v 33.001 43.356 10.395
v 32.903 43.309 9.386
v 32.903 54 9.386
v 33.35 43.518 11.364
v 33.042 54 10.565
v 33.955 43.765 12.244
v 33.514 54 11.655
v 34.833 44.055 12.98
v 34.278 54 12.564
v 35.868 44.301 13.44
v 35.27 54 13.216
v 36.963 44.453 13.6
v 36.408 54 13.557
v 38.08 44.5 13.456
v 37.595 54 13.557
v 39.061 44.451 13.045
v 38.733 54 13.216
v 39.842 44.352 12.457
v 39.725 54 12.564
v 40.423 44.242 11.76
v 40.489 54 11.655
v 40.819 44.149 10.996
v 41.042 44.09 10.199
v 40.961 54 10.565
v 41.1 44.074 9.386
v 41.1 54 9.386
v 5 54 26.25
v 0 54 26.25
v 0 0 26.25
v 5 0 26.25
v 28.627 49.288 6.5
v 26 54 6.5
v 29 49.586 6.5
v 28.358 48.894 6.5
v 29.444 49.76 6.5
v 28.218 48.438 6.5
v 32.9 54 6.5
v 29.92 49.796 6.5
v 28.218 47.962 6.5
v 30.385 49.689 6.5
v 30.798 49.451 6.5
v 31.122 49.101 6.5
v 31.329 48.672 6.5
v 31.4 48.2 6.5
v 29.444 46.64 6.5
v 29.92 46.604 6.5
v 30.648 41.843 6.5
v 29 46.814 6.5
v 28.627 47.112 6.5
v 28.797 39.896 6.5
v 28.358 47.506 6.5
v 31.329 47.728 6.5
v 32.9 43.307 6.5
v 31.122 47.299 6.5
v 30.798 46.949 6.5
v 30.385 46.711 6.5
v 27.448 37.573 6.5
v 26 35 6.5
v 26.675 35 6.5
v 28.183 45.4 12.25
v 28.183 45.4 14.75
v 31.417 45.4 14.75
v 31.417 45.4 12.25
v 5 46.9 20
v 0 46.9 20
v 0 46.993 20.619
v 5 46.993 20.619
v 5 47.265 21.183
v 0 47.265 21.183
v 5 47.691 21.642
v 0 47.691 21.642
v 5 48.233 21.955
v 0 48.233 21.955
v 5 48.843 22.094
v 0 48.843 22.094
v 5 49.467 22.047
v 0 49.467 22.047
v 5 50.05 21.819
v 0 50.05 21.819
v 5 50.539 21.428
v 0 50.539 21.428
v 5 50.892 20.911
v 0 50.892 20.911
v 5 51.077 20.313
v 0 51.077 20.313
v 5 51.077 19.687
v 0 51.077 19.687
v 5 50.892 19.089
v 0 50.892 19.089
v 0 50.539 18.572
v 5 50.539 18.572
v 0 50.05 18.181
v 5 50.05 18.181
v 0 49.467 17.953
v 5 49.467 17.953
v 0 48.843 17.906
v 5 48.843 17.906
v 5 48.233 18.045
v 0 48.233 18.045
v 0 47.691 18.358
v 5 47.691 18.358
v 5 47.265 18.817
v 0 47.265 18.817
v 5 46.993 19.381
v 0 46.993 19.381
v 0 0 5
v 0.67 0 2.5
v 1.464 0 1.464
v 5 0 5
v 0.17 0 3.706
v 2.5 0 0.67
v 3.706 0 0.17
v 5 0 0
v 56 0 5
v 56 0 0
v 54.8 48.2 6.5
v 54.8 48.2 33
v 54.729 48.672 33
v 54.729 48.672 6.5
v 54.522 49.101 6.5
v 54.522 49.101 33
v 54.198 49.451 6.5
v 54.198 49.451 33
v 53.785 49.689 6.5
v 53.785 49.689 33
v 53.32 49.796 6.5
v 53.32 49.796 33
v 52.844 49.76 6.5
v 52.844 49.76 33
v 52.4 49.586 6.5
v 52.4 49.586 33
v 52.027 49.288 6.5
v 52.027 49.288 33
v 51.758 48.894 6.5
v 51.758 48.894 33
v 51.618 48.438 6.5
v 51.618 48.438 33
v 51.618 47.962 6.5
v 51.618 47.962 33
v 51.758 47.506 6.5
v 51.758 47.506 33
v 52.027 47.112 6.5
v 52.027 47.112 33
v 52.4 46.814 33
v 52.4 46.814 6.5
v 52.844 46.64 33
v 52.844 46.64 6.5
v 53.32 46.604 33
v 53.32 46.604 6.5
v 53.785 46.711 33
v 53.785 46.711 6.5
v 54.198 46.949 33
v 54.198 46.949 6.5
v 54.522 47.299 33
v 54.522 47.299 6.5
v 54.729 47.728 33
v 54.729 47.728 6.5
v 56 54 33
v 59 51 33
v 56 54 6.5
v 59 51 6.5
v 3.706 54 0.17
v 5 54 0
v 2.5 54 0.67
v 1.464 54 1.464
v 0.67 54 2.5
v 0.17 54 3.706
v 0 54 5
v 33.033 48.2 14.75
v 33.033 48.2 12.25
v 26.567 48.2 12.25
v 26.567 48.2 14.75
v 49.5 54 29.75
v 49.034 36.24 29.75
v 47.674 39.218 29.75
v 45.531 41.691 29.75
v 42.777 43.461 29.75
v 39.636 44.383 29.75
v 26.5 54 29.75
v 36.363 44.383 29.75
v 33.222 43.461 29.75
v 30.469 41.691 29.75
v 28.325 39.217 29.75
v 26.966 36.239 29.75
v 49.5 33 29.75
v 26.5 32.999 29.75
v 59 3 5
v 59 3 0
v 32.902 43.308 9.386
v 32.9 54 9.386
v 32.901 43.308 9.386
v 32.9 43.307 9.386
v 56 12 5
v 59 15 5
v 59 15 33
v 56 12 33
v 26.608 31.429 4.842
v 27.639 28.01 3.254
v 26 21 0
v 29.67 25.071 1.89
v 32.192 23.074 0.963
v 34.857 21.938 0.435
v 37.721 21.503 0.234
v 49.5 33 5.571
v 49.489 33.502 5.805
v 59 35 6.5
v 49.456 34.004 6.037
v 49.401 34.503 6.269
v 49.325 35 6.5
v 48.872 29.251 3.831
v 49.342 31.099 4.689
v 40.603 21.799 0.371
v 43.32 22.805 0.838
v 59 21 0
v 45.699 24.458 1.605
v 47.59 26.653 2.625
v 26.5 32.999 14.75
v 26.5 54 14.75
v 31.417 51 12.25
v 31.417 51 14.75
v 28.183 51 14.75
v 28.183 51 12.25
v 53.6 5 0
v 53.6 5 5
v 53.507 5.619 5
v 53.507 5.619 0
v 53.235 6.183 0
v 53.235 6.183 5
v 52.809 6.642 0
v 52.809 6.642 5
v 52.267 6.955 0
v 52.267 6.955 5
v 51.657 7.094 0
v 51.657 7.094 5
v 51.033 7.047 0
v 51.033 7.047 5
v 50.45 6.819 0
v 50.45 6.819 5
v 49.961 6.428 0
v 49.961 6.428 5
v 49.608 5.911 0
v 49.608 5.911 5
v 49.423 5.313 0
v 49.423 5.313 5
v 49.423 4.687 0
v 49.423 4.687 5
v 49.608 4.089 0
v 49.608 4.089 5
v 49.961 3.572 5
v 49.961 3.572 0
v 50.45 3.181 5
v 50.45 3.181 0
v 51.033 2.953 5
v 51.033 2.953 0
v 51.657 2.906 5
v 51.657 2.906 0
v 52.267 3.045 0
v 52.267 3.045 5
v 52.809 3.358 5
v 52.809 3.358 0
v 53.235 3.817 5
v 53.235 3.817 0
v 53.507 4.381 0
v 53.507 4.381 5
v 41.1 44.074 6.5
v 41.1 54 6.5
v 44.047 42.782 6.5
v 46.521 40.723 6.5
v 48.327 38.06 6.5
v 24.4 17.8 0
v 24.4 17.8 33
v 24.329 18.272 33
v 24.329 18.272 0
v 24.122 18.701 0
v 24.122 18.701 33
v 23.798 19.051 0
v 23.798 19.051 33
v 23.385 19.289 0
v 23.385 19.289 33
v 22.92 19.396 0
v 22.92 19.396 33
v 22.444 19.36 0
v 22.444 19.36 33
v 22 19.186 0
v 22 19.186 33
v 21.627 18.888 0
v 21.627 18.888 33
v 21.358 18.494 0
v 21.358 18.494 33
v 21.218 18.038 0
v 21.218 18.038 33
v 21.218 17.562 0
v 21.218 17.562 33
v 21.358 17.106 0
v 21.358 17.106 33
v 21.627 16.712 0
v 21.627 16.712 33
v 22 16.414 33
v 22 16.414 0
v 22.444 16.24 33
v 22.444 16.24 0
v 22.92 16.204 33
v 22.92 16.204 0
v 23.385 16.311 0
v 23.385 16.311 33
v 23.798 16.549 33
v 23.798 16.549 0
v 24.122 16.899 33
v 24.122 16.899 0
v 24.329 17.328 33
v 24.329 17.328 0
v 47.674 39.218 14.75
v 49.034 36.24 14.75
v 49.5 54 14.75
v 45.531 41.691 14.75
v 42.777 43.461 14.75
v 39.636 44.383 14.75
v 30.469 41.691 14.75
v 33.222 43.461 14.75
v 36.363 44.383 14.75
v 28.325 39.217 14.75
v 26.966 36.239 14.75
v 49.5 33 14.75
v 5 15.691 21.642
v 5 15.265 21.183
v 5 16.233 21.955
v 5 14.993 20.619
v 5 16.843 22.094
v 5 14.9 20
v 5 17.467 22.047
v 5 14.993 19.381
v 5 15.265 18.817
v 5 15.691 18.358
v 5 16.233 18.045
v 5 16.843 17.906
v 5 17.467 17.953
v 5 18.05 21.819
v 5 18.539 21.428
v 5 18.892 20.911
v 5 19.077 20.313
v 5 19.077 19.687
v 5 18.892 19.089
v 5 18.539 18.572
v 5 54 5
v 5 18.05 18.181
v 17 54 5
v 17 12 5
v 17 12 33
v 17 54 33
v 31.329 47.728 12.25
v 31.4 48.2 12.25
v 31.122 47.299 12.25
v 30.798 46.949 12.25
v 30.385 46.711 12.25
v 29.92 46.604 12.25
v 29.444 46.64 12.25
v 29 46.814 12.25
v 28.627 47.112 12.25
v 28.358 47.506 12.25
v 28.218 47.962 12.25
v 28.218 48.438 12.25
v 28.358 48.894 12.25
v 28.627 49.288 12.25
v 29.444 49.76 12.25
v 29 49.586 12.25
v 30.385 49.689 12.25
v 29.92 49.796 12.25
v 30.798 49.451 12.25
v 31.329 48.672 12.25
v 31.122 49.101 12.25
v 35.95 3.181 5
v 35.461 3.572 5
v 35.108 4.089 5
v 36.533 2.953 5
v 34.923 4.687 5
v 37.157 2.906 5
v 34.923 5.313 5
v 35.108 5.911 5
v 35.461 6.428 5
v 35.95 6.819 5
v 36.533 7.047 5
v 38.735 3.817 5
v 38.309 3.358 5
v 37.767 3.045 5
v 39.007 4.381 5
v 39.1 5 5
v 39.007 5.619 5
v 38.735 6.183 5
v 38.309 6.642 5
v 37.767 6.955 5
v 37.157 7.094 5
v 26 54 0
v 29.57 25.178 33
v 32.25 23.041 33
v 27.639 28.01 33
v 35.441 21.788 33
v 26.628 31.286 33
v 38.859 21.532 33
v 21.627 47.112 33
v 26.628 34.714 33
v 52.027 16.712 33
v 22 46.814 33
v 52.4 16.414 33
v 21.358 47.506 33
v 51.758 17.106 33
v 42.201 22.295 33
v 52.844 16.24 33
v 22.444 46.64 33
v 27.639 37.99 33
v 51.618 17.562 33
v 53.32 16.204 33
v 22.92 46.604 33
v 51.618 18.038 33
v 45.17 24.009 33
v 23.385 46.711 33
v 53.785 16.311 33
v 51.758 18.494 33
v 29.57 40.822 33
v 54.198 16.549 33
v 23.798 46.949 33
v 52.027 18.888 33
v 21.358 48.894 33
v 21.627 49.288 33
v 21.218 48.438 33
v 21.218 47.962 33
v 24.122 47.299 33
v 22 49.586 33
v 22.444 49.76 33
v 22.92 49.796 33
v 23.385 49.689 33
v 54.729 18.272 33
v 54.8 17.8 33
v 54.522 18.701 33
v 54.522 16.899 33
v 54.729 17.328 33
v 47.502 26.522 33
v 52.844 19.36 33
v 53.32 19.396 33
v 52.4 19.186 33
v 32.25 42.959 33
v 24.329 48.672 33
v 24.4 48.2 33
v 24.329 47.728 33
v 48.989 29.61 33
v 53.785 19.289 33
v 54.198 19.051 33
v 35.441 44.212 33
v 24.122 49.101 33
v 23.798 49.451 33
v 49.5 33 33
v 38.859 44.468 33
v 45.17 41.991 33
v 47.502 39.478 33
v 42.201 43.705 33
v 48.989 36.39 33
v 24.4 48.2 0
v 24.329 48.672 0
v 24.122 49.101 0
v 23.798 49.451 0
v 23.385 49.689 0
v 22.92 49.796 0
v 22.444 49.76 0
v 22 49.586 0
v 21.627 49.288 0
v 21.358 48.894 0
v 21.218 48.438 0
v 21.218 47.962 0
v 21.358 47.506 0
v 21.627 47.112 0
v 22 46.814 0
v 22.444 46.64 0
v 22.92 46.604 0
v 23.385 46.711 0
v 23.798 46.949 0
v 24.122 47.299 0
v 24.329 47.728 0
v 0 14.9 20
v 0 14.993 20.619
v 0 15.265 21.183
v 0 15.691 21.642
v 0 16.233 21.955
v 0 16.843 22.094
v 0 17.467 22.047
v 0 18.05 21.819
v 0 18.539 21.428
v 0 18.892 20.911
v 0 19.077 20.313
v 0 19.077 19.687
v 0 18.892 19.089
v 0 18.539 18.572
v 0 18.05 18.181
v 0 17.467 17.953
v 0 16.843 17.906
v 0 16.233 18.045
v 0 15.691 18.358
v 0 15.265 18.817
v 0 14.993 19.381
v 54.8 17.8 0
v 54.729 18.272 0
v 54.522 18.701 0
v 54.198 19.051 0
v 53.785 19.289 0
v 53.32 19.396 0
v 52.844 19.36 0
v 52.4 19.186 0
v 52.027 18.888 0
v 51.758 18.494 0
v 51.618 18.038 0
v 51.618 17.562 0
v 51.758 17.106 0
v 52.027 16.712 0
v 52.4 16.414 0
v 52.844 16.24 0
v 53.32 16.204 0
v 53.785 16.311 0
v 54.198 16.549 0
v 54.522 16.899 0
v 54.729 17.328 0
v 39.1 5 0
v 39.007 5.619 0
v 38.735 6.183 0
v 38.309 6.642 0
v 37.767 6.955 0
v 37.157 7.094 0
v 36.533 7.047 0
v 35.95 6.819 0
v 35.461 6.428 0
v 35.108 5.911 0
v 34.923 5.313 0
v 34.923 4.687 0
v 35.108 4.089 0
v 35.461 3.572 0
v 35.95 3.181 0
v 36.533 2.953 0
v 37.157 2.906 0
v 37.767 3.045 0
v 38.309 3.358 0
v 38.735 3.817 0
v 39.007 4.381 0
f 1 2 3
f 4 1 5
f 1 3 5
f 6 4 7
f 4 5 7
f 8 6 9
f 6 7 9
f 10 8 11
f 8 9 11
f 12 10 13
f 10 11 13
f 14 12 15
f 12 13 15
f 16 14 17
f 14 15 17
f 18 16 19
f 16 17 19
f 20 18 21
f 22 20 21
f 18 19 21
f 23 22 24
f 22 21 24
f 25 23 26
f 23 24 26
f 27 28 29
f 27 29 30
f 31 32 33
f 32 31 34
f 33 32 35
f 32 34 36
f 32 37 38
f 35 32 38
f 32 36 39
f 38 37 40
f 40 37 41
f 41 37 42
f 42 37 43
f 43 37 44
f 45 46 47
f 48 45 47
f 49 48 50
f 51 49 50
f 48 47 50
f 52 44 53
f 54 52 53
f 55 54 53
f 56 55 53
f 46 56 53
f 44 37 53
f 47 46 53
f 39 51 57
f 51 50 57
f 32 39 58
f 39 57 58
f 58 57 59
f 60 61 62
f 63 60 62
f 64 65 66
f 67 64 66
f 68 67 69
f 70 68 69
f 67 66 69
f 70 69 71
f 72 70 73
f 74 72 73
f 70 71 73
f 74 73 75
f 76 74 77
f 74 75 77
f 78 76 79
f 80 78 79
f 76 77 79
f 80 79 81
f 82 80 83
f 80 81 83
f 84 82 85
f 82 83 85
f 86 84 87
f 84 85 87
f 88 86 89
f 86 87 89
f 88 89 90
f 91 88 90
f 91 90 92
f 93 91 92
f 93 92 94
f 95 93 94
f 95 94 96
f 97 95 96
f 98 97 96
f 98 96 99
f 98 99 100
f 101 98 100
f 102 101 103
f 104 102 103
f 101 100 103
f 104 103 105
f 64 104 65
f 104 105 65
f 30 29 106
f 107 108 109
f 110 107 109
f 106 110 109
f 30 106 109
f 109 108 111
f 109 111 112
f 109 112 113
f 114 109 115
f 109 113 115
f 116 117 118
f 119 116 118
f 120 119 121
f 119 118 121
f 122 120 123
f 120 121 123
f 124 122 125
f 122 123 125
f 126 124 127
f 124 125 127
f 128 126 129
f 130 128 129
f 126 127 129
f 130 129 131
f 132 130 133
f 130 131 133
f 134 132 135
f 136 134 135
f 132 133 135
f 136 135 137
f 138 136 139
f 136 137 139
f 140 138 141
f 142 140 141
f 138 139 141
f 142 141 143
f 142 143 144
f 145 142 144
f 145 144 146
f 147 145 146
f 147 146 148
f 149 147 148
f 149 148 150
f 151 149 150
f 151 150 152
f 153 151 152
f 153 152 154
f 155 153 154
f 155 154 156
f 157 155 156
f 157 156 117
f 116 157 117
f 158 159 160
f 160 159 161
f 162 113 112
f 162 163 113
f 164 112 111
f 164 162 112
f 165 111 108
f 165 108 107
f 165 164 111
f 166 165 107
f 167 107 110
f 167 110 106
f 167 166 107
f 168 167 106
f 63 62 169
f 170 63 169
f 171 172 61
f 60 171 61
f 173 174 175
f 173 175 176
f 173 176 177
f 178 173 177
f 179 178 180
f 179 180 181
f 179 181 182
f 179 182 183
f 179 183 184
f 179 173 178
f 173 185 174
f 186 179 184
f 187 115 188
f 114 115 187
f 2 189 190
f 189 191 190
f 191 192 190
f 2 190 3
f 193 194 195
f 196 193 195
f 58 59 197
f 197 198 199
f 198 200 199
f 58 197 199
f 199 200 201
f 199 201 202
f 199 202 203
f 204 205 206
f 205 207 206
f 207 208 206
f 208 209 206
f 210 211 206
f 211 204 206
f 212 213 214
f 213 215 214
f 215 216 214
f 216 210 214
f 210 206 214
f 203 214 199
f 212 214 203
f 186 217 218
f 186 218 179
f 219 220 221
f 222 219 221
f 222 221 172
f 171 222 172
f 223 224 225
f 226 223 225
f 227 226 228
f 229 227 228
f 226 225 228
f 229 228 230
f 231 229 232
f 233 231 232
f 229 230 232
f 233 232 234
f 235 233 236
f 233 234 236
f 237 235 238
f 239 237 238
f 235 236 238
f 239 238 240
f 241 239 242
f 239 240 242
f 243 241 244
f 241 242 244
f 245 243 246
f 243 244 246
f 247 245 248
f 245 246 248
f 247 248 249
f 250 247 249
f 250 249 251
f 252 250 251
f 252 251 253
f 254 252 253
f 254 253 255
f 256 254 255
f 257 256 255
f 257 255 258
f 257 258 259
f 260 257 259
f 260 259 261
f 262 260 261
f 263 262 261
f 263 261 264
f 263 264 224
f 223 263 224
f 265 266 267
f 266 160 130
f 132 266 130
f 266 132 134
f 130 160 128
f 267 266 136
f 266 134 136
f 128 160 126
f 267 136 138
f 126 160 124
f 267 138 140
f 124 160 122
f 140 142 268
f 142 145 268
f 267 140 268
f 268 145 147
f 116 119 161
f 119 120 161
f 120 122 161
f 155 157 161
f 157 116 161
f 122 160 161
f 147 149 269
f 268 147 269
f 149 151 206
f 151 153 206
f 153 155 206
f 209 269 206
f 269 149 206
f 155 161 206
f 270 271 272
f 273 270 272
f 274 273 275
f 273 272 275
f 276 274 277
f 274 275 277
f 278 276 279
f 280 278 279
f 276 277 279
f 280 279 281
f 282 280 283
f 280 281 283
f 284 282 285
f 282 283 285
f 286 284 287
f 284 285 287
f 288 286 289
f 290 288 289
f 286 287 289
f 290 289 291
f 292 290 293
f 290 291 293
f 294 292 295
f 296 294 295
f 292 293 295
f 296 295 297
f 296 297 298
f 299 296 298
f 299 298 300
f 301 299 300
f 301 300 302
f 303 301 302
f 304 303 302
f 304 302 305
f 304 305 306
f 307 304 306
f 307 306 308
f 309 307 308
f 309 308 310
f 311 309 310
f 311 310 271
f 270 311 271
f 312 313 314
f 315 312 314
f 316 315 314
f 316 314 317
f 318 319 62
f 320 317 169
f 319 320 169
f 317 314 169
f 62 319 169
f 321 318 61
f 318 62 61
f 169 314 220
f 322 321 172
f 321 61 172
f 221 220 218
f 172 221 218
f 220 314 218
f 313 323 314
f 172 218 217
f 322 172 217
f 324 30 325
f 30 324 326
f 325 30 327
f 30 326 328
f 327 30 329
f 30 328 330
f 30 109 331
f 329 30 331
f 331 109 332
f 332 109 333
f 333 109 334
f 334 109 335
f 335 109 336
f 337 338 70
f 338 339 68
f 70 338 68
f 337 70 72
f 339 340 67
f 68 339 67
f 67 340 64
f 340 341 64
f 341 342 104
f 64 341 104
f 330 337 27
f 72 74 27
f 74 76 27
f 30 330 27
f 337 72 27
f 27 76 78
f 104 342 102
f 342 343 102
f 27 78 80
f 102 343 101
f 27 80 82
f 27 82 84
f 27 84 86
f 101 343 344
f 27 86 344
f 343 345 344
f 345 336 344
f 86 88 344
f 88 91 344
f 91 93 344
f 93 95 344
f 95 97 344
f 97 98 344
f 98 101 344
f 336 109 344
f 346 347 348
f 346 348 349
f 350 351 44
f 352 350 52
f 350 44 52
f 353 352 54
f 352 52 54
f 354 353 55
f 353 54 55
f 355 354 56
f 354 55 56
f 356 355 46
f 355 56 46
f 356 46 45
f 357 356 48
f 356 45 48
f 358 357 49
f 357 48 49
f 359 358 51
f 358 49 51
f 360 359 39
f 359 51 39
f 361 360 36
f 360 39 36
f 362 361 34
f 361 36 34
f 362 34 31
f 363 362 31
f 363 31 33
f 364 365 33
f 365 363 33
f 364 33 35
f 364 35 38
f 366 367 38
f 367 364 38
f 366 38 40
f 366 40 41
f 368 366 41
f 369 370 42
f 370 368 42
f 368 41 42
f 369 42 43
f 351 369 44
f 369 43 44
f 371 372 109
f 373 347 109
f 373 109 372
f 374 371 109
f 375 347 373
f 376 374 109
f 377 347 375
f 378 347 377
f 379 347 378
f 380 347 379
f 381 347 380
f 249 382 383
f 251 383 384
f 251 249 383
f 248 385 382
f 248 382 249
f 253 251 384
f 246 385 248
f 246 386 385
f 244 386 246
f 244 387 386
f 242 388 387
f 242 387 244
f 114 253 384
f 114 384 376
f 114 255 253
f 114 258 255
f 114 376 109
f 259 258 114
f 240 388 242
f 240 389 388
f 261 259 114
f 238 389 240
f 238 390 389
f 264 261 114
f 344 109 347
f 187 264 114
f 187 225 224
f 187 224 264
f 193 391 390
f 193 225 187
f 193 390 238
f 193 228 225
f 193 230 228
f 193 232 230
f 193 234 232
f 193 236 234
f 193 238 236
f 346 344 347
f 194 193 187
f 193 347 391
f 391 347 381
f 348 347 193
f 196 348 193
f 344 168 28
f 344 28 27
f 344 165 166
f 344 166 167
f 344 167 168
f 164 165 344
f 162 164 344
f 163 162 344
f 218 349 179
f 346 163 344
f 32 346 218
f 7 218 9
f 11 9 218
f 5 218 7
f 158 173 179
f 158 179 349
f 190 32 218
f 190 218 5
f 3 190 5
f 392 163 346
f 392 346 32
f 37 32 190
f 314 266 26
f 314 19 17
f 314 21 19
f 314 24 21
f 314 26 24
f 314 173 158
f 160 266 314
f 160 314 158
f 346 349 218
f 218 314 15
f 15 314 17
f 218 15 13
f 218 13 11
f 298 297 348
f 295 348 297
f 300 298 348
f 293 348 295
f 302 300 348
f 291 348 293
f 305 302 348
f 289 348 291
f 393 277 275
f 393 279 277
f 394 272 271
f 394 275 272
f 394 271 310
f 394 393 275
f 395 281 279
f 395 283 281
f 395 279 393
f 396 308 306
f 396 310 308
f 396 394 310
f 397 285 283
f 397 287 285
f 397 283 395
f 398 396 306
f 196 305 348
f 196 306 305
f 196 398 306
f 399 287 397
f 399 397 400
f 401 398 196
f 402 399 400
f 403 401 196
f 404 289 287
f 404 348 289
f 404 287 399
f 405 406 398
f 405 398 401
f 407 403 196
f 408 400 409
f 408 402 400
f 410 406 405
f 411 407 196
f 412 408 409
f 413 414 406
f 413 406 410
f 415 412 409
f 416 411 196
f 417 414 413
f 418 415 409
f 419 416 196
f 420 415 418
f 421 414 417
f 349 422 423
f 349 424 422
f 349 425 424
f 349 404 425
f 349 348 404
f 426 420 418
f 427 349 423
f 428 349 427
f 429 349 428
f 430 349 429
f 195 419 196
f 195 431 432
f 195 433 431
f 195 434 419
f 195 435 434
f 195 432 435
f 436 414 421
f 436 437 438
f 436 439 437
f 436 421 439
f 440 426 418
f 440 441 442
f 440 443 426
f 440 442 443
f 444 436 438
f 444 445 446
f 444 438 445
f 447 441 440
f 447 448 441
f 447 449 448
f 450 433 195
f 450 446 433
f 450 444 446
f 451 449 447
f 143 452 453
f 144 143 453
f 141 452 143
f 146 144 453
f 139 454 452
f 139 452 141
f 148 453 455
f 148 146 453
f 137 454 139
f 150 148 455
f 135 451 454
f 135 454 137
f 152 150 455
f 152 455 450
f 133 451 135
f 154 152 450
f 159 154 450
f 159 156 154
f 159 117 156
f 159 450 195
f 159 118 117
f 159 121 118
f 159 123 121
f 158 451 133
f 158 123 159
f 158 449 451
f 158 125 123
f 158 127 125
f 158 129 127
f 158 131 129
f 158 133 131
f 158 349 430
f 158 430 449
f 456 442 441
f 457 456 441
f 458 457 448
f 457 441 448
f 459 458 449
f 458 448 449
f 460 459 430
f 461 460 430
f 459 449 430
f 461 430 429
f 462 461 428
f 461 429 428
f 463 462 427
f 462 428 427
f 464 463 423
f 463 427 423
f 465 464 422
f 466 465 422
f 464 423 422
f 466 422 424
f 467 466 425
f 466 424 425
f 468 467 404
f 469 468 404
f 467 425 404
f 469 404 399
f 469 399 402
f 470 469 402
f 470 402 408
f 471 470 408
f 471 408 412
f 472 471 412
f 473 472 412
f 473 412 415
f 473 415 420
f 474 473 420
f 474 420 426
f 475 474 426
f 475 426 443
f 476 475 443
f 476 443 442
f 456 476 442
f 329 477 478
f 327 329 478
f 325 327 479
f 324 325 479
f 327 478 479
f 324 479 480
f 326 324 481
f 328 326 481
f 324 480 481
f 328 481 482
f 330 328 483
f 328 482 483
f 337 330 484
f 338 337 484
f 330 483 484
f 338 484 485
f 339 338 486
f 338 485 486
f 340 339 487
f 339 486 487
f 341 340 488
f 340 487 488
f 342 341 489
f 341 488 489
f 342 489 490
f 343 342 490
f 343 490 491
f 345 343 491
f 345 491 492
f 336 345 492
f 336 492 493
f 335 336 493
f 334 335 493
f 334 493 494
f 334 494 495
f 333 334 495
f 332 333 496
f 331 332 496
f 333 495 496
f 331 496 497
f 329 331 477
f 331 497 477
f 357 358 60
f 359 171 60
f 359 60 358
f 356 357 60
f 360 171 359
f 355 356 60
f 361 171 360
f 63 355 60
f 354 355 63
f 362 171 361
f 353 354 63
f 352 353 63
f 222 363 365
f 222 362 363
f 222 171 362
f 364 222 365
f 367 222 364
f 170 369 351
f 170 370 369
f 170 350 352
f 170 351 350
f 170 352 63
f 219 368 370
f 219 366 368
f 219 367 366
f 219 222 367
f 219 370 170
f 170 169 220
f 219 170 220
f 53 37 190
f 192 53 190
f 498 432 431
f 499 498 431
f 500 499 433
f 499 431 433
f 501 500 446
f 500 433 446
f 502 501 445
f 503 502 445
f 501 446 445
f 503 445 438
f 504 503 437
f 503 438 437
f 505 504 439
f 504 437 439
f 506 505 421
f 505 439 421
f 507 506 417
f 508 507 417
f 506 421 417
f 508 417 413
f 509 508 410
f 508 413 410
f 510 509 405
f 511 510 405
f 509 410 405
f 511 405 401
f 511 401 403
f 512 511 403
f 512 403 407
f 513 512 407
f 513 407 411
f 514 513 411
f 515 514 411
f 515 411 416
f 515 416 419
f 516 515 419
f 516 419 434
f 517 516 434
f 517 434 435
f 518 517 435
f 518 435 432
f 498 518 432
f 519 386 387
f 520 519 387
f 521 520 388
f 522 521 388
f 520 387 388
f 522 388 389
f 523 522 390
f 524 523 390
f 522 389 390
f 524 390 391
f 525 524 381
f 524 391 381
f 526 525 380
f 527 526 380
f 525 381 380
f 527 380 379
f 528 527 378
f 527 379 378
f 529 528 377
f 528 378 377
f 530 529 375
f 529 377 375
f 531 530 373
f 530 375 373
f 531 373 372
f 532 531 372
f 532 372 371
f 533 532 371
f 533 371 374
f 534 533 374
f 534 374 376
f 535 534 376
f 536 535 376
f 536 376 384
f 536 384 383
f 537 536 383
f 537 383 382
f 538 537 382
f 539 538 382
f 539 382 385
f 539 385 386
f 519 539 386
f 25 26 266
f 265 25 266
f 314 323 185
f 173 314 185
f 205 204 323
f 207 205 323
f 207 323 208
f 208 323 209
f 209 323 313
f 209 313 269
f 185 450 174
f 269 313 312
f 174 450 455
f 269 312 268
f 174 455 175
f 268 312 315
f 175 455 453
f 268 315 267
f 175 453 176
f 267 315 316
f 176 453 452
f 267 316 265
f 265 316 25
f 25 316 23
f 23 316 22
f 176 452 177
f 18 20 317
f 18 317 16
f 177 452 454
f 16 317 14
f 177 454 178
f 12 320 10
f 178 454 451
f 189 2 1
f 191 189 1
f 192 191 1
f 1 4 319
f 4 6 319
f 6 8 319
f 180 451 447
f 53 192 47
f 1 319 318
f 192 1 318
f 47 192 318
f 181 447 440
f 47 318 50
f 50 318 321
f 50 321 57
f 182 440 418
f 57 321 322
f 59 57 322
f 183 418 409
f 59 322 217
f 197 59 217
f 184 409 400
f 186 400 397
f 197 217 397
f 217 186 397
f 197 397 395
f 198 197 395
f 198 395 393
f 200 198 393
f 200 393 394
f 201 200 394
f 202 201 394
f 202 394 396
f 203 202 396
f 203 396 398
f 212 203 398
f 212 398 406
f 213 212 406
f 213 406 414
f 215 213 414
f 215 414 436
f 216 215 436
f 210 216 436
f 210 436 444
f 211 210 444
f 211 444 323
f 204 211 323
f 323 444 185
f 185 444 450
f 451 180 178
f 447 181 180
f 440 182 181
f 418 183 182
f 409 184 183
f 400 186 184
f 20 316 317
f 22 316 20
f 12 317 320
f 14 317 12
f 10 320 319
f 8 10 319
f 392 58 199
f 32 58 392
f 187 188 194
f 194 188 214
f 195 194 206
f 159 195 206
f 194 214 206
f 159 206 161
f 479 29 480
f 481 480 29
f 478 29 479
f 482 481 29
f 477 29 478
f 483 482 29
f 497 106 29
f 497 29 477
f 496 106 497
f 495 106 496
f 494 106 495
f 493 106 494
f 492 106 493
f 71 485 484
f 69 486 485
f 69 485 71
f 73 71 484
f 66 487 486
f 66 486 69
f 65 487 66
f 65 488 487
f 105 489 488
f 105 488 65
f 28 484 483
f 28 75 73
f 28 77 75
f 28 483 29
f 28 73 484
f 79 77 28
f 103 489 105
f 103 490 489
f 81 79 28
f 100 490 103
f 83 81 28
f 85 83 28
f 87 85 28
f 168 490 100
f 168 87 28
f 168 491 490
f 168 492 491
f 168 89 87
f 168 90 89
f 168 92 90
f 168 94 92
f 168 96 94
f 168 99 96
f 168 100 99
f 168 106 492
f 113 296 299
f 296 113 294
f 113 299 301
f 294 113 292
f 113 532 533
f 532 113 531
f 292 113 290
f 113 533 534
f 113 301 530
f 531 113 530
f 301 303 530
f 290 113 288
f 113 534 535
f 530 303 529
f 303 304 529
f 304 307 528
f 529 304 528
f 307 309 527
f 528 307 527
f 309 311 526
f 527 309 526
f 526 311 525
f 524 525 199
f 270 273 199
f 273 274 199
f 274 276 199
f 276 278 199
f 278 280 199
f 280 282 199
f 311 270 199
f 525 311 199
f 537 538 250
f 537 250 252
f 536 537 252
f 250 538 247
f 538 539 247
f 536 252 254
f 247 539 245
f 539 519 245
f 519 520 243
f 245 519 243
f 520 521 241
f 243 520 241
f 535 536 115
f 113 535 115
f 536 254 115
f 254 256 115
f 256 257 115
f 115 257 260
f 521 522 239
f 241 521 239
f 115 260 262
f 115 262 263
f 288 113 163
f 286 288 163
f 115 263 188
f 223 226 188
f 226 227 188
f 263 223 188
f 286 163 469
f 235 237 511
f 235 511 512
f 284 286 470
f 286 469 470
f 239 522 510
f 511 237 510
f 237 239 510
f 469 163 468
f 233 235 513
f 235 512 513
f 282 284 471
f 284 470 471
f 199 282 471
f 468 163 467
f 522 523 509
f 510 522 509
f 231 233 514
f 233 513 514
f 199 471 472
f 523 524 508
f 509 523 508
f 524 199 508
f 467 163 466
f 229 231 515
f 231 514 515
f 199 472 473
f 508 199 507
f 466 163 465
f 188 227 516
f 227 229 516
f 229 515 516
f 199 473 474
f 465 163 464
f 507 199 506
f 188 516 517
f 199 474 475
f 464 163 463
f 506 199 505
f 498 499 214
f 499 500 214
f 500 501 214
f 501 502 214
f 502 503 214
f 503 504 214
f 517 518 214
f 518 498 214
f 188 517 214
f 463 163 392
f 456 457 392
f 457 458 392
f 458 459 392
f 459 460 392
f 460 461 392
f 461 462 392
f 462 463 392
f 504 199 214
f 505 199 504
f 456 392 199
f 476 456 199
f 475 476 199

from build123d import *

# Parameters (mm, degrees)
F0_W      = 59
F0_H      = 54
F1_DEPTH  = 5
F2_W      = 5
F2_H      = 54
F3_DEPTH  = 21.25
F4_W      = 42
F4_H      = 42
F5_DEPTH  = 28
F6_R      = 1.6
F6_R_2    = 11.5
F7_DEPTH  = 33.001
F8_R      = 2.1
F9_DEPTH  = 5.001
F10_W     = 23
F10_H     = 15
F11_DEPTH = 21.001
F13_DEPTH = 33
F14_SIZE  = 3
F16_DEPTH = 10.6937211186
F17_R     = 5
F18_R     = 1.6
F19_DEPTH = 8.25
F20_R     = 1.6
F21_DEPTH = 2.5
F22_R     = 2.1
F23_DEPTH = 5


with BuildPart() as f1:
    # F0 (on Top) → F1 (new body)
    with BuildSketch(Plane.XY):
        with Locations((29.5, 27)):
            Rectangle(F0_W, F0_H)
    extrude(amount=F1_DEPTH)

    # F2 (on face) → F3 (join)
    with BuildSketch(Plane.XY.offset(5)):
        with Locations((2.5, 27)):
            Rectangle(F2_W, F2_H)
    extrude(amount=F3_DEPTH)

    # F4 (on face) → F5 (join)
    with BuildSketch(Plane.XY.offset(5)):
        with Locations((38, 33)):
            Rectangle(F4_W, F4_H)
    extrude(amount=F5_DEPTH)

    # F6 (on face) → F7 (cut, through all)
    with BuildSketch(Plane.XY.offset(33)):
        with Locations((22.8, 48.2)):
            Circle(F6_R)
        with Locations((38, 33)):
            Circle(F6_R_2)
        with Locations((53.2, 48.2)):
            Circle(F6_R)
        with Locations((22.8, 17.8)):
            Circle(F6_R)
        with Locations((53.2, 17.8)):
            Circle(F6_R)
    extrude(amount=-F7_DEPTH, mode=Mode.SUBTRACT)

    # F8 (on face) → F9 (cut, through all)
    with BuildSketch(Plane.XY.offset(5)):
        with Locations((37, 5)):
            Circle(F8_R)
        with Locations((51.5, 5)):
            Circle(F8_R)
    extrude(amount=-F9_DEPTH, mode=Mode.SUBTRACT)

    # F10 (on face) → F11 (cut, through all)
    with BuildSketch(Plane(origin=(0, 54, 0), x_dir=(-1, 0, 0), z_dir=(0, 1, 0))):
        with Locations((-38, 22.25)):
            Rectangle(F10_W, F10_H)
    extrude(amount=-F11_DEPTH, mode=Mode.SUBTRACT)

    # F12 (on face) → F13 (cut)
    with BuildSketch(Plane.YZ.offset(59)):
        Polygon((54, 0), (54, 6.5), (35, 6.5), (21, 0), align=None)
    extrude(amount=-F13_DEPTH, mode=Mode.SUBTRACT)

    # F14
    f14_edges = [f1.edges().sort_by_distance(p)[0] for p in [
        (59, 0, 2.5),
        (59, 12, 19),
        (59, 54, 19.75),
    ]]
    chamfer(f14_edges, length=F14_SIZE)

    # F15 (on face) → F16 (cut, through all)
    with BuildSketch(Plane(origin=(0, 54, 0), x_dir=(-1, 0, 0), z_dir=(0, 1, 0))):
        with BuildLine():
            Line((-32.9, 9.385948213), (-32.9031732506, 9.385948213))
            ThreePointArc((-32.9031732506, 9.385948213), (-37.0015866253, 13.6), (-41.1, 9.385948213))
            Line((-41.1, 9.385948213), (-41.1, 6.5))
            Line((-41.1, 6.5), (-32.9, 6.5))
            Line((-32.9, 6.5), (-32.9, 9.385948213))
        make_face()
    extrude(amount=-F16_DEPTH, mode=Mode.SUBTRACT)

    # F17
    f17_edges = [f1.edges().sort_by_distance(p)[0] for p in [
        (0, 27, 0),
    ]]
    fillet(f17_edges, radius=F17_R)

    # F18 (on face) → F19 (cut, through all)
    with BuildSketch(Plane(origin=(0, 0, 6.5), x_dir=(1, 0, 0), z_dir=(0, 0, -1))):
        with Locations((29.8, -48.2)):
            Circle(F18_R)
    extrude(amount=-F19_DEPTH, mode=Mode.SUBTRACT)

    # F20 (on face) → F21 (cut)
    with BuildSketch(Plane.XY.offset(14.75)):
        Polygon((31.4165807537, 45.4), (33.0331615075, 48.2), (31.4165807537, 51), (28.1834192463, 51), (26.5668384925, 48.2), (28.1834192463, 45.4), align=None)
        with Locations((29.8, 48.2)):
            Circle(F20_R, mode=Mode.SUBTRACT)
    extrude(amount=-F21_DEPTH, mode=Mode.SUBTRACT)

    # F22 (on face) → F23 (cut, through all)
    with BuildSketch(Plane(origin=(0, 0, 0), x_dir=(0, -1, 0), z_dir=(-1, 0, 0))):
        with Locations((-49, 20)):
            Circle(F22_R)
        with Locations((-17, 20)):
            Circle(F22_R)
    extrude(amount=-F23_DEPTH, mode=Mode.SUBTRACT)


solid = f1.part
